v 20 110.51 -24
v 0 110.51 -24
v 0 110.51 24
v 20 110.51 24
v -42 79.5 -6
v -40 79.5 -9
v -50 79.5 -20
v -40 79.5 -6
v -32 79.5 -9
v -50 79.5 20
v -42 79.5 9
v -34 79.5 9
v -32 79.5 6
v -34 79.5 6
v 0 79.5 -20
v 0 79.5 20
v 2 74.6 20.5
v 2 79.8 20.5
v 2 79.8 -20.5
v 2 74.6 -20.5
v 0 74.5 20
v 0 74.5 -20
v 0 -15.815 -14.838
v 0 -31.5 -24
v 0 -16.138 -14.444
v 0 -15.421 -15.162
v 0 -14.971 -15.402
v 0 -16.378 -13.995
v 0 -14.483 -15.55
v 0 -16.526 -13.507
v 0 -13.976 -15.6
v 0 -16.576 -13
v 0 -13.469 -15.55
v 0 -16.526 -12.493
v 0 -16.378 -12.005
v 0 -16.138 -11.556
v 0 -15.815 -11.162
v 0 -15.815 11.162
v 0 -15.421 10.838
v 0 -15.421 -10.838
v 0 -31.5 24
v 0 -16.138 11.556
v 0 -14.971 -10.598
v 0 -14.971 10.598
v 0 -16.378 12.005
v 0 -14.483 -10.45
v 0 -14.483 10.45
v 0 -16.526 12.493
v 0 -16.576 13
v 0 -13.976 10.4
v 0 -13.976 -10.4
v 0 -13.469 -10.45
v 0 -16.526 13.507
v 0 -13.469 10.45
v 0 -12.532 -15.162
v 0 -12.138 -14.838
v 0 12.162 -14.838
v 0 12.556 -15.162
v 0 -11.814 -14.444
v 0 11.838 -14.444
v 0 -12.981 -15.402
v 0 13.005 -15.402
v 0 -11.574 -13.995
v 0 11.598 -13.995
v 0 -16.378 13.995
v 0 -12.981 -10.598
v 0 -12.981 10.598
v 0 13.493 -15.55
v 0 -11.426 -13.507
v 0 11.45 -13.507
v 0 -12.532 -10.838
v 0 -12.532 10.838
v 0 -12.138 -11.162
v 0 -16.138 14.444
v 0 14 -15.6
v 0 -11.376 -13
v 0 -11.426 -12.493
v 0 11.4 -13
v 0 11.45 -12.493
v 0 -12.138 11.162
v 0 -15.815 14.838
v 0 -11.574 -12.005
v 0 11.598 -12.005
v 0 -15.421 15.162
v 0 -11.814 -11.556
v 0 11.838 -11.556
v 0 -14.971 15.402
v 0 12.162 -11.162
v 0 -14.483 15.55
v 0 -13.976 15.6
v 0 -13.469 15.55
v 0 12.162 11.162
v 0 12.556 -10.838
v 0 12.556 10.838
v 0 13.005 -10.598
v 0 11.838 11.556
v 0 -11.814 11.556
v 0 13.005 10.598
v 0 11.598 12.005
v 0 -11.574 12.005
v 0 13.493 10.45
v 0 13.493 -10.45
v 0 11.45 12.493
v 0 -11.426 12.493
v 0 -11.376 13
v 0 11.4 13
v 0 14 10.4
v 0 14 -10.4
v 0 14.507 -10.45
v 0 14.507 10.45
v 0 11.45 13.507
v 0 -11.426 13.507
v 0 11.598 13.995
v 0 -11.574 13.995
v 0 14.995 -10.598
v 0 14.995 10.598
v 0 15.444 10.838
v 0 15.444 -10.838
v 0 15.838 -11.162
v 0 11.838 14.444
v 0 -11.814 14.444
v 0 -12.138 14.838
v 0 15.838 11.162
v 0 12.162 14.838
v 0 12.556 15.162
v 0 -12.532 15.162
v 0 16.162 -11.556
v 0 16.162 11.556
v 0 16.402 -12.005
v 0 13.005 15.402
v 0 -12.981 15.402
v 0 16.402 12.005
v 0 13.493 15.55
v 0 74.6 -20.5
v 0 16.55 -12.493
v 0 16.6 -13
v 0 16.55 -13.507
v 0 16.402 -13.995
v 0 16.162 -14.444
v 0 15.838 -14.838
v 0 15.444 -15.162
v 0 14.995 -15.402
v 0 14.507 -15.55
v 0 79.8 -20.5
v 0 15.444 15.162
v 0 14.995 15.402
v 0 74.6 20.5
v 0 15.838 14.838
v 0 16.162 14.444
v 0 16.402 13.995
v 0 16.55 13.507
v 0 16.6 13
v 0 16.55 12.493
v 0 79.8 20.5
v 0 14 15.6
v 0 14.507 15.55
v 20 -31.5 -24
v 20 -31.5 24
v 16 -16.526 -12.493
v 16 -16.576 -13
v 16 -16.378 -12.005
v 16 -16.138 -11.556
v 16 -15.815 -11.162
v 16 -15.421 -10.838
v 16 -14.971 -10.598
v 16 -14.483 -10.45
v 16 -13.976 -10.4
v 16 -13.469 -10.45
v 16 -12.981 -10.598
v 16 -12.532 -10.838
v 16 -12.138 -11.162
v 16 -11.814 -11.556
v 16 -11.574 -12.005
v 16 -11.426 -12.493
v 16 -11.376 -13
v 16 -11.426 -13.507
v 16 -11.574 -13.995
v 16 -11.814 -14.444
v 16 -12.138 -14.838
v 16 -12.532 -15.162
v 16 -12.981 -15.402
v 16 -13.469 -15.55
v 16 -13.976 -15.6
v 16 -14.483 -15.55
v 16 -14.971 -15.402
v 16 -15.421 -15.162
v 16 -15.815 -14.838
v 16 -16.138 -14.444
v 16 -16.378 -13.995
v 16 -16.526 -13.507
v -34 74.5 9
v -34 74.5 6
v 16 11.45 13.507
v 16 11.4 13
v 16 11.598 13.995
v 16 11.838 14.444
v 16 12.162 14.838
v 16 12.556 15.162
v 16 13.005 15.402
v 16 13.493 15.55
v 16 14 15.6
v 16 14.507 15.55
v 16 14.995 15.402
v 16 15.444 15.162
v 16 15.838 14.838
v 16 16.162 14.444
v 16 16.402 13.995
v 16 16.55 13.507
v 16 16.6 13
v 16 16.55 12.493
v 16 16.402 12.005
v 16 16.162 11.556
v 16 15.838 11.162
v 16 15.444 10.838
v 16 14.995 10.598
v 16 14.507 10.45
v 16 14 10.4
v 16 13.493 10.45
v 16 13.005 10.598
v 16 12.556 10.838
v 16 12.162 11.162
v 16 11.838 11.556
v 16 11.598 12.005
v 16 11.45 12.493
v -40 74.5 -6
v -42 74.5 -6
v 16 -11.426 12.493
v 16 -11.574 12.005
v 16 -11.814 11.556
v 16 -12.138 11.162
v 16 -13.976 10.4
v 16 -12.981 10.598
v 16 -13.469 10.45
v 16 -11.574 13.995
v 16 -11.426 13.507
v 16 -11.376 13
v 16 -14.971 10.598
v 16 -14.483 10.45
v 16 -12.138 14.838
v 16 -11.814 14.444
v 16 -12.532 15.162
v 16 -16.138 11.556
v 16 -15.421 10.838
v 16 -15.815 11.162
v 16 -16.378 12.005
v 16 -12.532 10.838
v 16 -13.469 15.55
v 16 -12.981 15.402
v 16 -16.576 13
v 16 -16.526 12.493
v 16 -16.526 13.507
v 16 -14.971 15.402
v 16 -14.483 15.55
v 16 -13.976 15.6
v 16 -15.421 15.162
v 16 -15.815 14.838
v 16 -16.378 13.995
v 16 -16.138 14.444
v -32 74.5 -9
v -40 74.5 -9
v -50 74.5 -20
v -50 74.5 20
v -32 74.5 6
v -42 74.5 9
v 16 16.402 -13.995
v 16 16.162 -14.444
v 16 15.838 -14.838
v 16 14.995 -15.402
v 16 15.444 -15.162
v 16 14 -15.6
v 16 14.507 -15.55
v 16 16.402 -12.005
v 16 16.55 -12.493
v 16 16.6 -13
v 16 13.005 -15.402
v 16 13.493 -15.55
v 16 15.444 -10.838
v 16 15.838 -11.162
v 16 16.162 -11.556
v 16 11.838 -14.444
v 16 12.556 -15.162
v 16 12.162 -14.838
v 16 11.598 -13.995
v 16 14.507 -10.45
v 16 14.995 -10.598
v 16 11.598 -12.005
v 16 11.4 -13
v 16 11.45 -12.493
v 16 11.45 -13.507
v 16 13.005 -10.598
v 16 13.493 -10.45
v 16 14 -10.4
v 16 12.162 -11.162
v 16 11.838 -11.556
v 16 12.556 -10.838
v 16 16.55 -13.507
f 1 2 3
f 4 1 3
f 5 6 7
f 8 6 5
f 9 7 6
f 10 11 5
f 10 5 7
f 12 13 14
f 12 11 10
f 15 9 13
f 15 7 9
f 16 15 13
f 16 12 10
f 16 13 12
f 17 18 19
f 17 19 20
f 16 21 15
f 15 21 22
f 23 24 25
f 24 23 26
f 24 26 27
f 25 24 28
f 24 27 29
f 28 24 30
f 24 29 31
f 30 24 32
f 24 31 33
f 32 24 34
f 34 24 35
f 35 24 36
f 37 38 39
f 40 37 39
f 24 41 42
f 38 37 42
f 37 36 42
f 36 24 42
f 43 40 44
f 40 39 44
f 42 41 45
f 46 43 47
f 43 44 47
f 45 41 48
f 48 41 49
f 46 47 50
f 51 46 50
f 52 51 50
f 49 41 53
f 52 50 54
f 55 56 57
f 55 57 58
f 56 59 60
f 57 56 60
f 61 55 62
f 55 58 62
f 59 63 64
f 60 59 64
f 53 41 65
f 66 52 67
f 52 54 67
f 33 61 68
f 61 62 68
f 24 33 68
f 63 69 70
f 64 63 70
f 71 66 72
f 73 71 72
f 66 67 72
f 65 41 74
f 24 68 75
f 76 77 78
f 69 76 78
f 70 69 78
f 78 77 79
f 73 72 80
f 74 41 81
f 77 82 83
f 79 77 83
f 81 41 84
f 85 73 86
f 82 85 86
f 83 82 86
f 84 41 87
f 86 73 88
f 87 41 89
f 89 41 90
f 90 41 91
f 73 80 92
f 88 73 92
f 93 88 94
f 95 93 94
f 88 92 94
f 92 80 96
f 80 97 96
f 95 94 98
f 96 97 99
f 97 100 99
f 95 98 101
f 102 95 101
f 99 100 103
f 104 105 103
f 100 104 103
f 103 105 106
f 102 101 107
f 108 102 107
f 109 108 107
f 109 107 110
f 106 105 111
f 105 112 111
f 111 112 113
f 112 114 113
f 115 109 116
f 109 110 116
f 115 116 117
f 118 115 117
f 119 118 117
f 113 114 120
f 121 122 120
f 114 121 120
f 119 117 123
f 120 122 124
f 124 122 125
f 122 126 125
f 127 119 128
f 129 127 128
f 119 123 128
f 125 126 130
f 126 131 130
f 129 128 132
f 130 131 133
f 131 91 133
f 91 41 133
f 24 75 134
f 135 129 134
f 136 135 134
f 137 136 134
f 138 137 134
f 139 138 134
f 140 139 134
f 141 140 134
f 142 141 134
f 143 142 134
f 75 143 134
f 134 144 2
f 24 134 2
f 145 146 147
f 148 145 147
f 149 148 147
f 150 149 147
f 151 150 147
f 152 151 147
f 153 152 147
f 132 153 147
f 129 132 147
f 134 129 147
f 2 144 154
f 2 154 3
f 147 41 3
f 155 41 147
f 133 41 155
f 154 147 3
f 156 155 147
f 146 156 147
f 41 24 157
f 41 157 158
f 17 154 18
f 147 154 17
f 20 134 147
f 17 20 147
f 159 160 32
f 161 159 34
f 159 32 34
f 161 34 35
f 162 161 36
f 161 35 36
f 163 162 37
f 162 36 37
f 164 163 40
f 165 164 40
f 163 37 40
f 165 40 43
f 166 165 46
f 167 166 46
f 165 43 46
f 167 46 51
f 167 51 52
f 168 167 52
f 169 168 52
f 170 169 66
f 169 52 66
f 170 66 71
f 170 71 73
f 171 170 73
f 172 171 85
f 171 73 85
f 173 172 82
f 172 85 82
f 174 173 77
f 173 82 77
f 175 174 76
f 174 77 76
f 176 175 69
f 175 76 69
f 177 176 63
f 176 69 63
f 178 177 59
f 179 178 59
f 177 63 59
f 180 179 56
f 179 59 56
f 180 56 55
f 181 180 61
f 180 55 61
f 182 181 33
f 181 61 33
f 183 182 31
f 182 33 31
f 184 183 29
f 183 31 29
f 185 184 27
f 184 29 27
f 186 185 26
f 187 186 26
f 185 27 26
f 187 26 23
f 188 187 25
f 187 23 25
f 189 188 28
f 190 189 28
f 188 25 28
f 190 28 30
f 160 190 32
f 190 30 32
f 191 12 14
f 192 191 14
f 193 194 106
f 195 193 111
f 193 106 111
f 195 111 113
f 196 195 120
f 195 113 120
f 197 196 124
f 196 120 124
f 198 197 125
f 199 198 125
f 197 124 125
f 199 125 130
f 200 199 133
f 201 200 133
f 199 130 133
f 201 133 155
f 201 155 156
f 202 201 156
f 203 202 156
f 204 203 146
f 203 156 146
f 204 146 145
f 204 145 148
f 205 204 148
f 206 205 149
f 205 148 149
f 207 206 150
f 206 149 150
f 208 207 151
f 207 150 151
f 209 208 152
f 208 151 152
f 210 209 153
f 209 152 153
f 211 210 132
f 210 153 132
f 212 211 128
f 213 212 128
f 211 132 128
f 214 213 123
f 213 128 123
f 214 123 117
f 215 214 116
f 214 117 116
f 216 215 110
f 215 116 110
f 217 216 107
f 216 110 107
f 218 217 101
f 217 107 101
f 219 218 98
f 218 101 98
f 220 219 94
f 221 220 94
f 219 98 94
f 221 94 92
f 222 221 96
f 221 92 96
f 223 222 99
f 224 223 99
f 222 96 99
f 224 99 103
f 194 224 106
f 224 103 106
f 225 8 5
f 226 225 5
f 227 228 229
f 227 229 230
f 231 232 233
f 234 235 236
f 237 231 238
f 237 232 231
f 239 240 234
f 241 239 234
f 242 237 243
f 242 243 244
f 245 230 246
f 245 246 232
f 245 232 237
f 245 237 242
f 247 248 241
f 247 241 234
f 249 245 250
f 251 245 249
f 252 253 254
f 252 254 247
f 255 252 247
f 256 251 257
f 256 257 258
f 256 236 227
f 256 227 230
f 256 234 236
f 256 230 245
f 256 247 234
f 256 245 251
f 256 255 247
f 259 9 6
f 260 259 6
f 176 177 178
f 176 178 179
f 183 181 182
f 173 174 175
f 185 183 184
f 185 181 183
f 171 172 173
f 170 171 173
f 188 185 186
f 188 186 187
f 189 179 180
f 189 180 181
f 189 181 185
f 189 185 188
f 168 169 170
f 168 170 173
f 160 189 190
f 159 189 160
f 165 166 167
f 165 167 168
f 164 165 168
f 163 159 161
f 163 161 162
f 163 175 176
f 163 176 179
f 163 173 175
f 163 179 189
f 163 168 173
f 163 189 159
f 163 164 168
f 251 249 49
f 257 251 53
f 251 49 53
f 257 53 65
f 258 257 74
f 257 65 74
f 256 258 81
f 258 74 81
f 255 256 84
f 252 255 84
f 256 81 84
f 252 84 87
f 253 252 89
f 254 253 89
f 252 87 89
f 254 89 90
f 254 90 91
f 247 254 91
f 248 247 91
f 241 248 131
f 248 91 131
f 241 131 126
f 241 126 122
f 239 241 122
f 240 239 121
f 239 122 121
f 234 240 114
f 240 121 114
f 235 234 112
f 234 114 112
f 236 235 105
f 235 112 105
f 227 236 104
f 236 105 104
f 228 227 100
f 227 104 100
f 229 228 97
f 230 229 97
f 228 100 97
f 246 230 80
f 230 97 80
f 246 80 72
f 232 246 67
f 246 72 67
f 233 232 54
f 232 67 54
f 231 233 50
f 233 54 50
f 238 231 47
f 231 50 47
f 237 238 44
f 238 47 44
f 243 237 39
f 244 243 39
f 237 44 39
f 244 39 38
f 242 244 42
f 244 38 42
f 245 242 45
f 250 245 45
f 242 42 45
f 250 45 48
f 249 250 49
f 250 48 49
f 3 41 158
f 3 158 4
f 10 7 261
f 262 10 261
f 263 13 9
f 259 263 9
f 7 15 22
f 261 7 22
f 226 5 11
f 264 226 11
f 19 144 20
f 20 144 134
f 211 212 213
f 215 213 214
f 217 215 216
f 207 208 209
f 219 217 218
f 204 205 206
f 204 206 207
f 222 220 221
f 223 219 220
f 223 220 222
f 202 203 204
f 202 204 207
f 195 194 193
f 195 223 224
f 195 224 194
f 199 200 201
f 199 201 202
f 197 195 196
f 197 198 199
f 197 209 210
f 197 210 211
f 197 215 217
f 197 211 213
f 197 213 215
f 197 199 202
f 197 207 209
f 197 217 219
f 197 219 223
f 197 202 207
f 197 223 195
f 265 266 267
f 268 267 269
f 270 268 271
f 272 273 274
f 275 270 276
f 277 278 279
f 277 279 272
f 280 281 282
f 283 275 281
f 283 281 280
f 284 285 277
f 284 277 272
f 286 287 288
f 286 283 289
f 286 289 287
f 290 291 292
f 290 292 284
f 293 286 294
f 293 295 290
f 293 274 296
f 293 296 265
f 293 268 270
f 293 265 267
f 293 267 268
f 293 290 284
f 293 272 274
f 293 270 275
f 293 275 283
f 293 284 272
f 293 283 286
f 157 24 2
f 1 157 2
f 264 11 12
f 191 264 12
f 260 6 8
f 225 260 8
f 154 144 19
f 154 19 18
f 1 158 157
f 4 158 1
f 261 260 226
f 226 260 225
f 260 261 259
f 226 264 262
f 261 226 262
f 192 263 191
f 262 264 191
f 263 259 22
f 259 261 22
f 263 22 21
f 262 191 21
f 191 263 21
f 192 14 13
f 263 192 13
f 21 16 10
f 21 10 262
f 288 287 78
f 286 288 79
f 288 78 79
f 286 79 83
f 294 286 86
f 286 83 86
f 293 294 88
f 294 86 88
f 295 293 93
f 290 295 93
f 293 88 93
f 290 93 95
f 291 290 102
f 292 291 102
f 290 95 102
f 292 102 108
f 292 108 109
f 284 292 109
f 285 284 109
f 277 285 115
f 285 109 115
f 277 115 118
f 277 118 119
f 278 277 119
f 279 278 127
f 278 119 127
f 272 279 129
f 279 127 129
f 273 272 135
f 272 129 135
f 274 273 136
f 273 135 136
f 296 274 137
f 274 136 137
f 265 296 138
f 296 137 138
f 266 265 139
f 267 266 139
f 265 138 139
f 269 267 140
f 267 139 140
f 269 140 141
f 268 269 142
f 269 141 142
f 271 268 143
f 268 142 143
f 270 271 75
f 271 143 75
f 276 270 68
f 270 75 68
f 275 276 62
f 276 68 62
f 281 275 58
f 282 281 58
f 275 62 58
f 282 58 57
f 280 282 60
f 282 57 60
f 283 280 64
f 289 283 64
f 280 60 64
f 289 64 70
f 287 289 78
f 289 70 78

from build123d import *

# Parameters (mm, degrees)
SKETCH2_W                = 142.009514535
SKETCH2_H                = 48
BOSS_EXTRUDE1_DEPTH      = 20
SKETCH3_R                = 2.6
CUT_EXTRUDE1_DEPTH       = 16
SKETCH4_W                = 5
SKETCH4_H                = 40
BOSS_EXTRUDE2_DEPTH      = 50
BOSS_EXTRUDE2_DEPTH_BACK = 2
CUT_EXTRUDE2_DEPTH       = 5
SKETCH8_W                = 5.2
SKETCH8_H                = 41
CUT_EXTRUDE3_DEPTH       = 2


with BuildPart() as part:
    # Sketch2 → Boss-Extrude1 (new body)
    with BuildSketch(Plane.YZ):
        with Locations((39.504757268, 0)):
            Rectangle(SKETCH2_W, SKETCH2_H)
    extrude(amount=BOSS_EXTRUDE1_DEPTH)

    # Sketch3 → Cut-Extrude1 (cut)
    with BuildSketch(Plane(origin=(0, 0, 0), x_dir=(0, -1, 0), z_dir=(-1, 0, 0))):
        with Locations((-14, 13)):
            Circle(SKETCH3_R)
        with Locations((13.976189248, 13)):
            Circle(SKETCH3_R)
        with Locations((13.976189248, -13)):
            Circle(SKETCH3_R)
        with Locations((-14, -13)):
            Circle(SKETCH3_R)
    extrude(amount=-CUT_EXTRUDE1_DEPTH, mode=Mode.SUBTRACT)

    # Sketch4 → Boss-Extrude2 (add, two sides)
    with BuildSketch(Plane(origin=(0, 0, 0), x_dir=(0, -1, 0), z_dir=(-1, 0, 0))) as boss_extrude2_sk:
        with Locations((-77, 0)):
            Rectangle(SKETCH4_W, SKETCH4_H)
    extrude(amount=BOSS_EXTRUDE2_DEPTH)
    extrude(boss_extrude2_sk.sketch, amount=-BOSS_EXTRUDE2_DEPTH_BACK)

    # Sketch5 → Cut-Extrude2 (cut)
    with BuildSketch(Plane(origin=(0, 79.5, 0), x_dir=(-1, 0, 0), z_dir=(0, 1, 0))):
        Polygon((32, -9), (40, -9), (40, -6), (42, -6), (42, 9), (34, 9), (34, 6), (32, 6), align=None)
    extrude(amount=-CUT_EXTRUDE2_DEPTH, mode=Mode.SUBTRACT)


with BuildPart() as body_2:
    # Split1: the piece on the far side of the plane
    add(part.part)
    split(bisect_by=Plane(origin=(0, 0, 0), x_dir=(0, 0, -1), z_dir=(-1, 0, 0)), keep=Keep.BOTTOM)

    # Sketch8 → Cut-Extrude3 (cut)
    with BuildSketch(Plane(origin=(0, 0, 0), x_dir=(0, -1, 0), z_dir=(-1, 0, 0))):
        with Locations((-77.2, 0)):
            Rectangle(SKETCH8_W, SKETCH8_H)
    extrude(amount=-CUT_EXTRUDE3_DEPTH, mode=Mode.SUBTRACT)


with BuildPart() as part_1:
    add(part.part)

    # Split1
    split(bisect_by=Plane(origin=(0, 0, 0), x_dir=(0, 0, -1), z_dir=(-1, 0, 0)), keep=Keep.TOP)


solid = Compound([body_2.part, part_1.part])
